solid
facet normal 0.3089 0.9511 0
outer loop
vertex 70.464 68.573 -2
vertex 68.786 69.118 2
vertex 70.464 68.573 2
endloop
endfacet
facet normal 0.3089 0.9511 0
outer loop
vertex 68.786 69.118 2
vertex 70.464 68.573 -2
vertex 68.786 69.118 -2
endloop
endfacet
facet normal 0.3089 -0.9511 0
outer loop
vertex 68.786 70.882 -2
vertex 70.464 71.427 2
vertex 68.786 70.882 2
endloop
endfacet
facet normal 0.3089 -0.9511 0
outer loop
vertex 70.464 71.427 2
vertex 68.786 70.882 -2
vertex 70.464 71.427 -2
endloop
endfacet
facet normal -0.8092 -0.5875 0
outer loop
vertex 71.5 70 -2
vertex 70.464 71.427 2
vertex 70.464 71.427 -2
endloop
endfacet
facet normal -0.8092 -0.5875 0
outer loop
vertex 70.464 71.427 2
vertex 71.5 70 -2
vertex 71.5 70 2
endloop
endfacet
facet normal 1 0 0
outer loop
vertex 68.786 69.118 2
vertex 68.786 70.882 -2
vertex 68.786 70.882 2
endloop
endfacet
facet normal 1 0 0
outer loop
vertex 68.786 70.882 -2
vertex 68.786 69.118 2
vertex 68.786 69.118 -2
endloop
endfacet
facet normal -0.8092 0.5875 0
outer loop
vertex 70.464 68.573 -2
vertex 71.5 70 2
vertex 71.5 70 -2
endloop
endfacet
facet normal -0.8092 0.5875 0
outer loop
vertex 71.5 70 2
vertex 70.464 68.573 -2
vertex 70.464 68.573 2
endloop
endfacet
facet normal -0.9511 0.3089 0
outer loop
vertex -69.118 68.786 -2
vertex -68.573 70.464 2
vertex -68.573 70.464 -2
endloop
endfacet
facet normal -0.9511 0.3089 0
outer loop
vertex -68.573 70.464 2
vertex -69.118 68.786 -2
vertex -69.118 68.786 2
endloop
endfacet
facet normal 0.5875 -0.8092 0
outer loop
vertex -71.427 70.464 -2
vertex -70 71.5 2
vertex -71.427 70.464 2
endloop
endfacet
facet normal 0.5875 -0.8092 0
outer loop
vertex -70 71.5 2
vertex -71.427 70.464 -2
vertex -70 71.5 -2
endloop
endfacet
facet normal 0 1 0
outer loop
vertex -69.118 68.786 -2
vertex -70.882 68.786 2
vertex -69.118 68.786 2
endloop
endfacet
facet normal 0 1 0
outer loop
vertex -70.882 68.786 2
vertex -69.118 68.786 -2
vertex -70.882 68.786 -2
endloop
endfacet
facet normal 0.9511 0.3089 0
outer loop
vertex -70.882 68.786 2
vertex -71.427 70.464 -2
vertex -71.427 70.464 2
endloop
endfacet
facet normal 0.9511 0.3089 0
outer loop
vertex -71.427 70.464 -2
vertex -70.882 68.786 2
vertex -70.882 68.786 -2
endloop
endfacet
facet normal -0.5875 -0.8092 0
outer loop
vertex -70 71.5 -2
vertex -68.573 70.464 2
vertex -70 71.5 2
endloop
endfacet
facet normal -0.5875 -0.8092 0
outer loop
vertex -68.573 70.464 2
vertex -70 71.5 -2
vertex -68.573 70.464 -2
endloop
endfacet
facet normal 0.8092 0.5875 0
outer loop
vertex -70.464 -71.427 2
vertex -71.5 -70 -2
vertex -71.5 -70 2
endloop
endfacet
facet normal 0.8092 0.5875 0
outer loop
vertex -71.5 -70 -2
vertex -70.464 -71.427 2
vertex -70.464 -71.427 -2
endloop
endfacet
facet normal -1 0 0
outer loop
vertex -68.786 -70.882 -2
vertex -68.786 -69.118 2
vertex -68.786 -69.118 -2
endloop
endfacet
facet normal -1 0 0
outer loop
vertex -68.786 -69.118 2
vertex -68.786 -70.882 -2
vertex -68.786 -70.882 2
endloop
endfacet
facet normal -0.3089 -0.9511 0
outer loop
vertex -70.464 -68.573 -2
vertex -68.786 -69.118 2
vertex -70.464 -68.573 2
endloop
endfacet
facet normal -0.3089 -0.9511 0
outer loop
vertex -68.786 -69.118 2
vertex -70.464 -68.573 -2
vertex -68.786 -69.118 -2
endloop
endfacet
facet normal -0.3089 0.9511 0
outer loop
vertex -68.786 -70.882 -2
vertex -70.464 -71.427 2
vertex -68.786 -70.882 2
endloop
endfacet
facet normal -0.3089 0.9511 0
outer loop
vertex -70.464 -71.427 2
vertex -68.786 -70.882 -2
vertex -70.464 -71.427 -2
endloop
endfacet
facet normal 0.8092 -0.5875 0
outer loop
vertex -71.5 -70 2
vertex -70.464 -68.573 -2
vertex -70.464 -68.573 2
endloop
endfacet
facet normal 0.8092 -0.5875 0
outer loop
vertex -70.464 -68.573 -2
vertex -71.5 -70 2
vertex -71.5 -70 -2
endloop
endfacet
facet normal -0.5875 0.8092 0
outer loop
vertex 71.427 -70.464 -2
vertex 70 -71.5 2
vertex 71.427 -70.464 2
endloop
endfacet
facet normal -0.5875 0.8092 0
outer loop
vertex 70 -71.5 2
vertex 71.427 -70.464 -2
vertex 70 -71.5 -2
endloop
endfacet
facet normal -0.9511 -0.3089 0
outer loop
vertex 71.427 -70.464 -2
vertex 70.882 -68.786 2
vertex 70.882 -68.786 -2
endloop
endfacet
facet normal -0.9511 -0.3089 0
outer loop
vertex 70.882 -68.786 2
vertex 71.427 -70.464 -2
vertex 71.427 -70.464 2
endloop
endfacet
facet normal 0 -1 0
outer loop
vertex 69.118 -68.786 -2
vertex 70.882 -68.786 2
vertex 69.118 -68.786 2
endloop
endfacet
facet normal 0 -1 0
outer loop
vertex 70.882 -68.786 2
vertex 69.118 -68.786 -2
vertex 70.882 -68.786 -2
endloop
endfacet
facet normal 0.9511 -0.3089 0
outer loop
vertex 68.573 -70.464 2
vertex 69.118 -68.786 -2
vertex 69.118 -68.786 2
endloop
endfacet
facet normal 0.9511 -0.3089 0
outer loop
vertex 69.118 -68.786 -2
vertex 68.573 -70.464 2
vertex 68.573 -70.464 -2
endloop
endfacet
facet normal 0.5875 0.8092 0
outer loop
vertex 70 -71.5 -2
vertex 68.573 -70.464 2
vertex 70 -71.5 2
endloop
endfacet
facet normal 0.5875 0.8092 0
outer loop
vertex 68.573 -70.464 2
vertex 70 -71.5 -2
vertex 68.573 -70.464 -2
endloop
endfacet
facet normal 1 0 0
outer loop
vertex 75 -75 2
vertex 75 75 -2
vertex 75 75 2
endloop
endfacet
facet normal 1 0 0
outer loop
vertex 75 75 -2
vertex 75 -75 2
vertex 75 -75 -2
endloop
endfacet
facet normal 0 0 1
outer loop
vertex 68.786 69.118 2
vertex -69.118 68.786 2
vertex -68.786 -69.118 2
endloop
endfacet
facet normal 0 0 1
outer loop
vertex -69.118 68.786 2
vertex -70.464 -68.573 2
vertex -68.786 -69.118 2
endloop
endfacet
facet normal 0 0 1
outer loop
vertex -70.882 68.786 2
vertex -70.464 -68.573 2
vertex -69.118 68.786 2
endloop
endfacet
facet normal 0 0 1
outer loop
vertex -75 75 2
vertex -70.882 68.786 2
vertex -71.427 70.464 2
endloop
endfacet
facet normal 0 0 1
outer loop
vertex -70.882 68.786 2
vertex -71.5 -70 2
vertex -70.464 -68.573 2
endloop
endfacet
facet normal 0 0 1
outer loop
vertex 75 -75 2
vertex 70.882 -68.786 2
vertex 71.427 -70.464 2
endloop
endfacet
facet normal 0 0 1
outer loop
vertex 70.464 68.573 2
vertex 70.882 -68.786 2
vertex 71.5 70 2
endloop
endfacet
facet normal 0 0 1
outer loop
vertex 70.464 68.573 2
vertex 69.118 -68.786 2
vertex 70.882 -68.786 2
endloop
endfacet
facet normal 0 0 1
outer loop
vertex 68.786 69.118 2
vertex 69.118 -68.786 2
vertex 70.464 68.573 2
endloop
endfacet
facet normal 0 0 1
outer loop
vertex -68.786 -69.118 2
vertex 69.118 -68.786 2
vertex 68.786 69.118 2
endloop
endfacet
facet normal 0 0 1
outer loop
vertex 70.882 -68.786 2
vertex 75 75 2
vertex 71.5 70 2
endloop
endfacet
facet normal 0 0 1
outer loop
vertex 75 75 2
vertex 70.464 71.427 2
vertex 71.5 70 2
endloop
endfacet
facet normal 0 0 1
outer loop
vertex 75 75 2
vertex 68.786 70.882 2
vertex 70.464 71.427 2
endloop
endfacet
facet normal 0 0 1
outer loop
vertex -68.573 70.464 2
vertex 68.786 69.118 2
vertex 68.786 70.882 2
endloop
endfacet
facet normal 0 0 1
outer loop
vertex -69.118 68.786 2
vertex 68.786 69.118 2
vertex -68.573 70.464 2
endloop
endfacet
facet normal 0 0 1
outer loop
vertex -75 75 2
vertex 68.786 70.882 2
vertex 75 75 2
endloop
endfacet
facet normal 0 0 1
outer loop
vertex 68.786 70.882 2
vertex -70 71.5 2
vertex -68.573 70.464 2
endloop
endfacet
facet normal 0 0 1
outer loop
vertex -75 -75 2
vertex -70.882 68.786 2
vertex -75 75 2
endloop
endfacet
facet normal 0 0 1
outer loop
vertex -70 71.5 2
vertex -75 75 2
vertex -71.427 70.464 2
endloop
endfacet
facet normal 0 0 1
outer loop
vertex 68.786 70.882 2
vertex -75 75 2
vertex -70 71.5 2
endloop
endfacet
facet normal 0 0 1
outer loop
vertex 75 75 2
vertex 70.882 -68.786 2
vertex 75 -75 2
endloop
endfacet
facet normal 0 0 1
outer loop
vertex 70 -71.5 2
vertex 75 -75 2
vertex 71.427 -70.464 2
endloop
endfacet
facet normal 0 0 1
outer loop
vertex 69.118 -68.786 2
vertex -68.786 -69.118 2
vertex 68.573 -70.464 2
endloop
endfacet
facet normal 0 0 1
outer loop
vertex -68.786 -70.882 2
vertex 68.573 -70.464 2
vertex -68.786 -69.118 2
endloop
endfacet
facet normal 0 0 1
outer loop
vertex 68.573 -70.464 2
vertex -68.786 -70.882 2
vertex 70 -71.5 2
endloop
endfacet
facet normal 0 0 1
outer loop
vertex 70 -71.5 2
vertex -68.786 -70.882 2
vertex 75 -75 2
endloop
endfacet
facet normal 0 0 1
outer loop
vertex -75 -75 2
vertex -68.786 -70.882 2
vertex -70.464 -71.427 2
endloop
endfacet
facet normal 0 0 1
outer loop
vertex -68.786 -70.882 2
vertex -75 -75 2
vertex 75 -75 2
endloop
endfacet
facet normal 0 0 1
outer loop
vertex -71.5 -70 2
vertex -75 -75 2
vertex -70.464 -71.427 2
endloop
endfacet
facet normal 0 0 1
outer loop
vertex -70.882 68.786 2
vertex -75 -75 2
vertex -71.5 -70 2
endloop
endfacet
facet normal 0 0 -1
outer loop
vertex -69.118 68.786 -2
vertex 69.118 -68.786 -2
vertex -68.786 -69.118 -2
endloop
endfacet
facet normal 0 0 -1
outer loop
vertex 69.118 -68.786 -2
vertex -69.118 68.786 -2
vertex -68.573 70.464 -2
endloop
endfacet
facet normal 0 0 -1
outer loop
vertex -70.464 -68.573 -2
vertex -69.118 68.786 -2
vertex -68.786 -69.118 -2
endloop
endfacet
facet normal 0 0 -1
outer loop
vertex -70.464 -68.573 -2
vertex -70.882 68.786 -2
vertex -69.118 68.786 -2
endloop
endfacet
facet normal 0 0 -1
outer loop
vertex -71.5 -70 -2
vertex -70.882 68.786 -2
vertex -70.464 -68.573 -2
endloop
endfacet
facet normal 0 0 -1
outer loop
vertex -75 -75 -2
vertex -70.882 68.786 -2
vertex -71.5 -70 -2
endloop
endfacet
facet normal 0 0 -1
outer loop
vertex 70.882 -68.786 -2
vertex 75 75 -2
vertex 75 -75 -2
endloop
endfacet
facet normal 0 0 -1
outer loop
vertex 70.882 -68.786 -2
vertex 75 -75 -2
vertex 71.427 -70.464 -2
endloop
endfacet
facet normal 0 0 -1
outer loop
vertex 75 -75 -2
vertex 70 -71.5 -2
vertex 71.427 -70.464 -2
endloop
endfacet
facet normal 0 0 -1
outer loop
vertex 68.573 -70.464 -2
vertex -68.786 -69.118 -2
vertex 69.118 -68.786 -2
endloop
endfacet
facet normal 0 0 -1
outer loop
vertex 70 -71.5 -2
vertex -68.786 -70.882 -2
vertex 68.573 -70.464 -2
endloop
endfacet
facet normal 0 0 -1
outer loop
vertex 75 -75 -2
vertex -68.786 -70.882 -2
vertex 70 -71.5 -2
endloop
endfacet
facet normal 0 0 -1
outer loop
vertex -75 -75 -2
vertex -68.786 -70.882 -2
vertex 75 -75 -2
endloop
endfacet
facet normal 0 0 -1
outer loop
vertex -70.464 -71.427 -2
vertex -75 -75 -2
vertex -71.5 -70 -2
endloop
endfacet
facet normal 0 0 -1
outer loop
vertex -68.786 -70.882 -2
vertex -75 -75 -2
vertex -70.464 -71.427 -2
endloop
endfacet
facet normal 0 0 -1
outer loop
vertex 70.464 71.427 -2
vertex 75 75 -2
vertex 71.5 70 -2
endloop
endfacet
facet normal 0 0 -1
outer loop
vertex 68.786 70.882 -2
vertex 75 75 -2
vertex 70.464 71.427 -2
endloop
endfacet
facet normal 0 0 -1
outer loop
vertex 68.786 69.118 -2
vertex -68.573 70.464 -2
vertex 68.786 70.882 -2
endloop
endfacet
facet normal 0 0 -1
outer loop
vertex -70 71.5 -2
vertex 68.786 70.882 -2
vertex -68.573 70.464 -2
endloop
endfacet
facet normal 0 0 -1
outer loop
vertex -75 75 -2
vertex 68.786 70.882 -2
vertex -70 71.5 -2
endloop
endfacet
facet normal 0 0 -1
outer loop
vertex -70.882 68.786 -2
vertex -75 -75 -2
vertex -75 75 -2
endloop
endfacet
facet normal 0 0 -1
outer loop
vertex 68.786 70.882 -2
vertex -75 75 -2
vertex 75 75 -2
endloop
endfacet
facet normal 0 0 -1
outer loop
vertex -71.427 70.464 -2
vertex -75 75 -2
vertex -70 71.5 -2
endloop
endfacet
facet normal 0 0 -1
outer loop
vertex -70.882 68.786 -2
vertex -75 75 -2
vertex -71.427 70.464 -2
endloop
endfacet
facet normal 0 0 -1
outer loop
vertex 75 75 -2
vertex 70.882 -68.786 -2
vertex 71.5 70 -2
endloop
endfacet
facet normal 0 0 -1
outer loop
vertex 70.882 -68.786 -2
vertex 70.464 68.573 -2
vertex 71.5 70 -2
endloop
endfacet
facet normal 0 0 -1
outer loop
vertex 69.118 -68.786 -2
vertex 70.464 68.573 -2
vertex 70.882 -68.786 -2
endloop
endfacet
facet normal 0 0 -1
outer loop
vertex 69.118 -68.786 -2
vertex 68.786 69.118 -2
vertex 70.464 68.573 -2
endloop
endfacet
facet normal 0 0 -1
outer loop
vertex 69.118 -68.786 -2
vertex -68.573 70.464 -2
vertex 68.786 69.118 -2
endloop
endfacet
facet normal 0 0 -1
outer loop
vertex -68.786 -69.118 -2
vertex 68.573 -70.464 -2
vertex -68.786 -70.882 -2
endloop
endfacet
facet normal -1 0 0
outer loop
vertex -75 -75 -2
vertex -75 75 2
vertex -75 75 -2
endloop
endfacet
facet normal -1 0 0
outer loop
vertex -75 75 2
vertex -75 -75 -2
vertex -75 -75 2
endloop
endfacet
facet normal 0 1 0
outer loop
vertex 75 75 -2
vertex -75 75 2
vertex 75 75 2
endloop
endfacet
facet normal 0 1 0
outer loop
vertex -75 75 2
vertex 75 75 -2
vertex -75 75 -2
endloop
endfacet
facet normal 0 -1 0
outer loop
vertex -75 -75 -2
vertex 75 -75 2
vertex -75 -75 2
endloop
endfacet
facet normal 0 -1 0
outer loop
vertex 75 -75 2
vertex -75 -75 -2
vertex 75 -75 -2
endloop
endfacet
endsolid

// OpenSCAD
// file: ../conf.scad
//rendering
epsilon=0.1;

//model
frame_length=1000;
frame_inner=13.5;
frame_outer=15;

support_width=100;
support_height=0.75;
support_inner=90;
support_diameter=3;

rack_width=150;
rack_inner=140;
rack_diameter=3;
rack_height=250;
rack_plate_height=4;

stand_height=250;
stand_width=282;
stand_diameter=6;
stand_head_height=35;
stand_head_diameter=4;

foot_outer=12;
foot_inner=8;
foot_length=500;

motor_hole_distance=480;
motor_hole_diameter=12;
motor_mount_distance=19;
motor_mount_diameter=3;
// main file
include <../conf.scad>

module rack_plate() {
color("black")
difference() {
	cube([rack_width, rack_width, rack_plate_height], center=true);
	for (i=[0:3]) {
		rotate([0,0,i*90])
		translate([rack_inner/2, rack_inner/2, 0])
		cylinder(rack_plate_height+epsilon, d=rack_diameter, center=true);
	}
	
}
}

rack_plate();
